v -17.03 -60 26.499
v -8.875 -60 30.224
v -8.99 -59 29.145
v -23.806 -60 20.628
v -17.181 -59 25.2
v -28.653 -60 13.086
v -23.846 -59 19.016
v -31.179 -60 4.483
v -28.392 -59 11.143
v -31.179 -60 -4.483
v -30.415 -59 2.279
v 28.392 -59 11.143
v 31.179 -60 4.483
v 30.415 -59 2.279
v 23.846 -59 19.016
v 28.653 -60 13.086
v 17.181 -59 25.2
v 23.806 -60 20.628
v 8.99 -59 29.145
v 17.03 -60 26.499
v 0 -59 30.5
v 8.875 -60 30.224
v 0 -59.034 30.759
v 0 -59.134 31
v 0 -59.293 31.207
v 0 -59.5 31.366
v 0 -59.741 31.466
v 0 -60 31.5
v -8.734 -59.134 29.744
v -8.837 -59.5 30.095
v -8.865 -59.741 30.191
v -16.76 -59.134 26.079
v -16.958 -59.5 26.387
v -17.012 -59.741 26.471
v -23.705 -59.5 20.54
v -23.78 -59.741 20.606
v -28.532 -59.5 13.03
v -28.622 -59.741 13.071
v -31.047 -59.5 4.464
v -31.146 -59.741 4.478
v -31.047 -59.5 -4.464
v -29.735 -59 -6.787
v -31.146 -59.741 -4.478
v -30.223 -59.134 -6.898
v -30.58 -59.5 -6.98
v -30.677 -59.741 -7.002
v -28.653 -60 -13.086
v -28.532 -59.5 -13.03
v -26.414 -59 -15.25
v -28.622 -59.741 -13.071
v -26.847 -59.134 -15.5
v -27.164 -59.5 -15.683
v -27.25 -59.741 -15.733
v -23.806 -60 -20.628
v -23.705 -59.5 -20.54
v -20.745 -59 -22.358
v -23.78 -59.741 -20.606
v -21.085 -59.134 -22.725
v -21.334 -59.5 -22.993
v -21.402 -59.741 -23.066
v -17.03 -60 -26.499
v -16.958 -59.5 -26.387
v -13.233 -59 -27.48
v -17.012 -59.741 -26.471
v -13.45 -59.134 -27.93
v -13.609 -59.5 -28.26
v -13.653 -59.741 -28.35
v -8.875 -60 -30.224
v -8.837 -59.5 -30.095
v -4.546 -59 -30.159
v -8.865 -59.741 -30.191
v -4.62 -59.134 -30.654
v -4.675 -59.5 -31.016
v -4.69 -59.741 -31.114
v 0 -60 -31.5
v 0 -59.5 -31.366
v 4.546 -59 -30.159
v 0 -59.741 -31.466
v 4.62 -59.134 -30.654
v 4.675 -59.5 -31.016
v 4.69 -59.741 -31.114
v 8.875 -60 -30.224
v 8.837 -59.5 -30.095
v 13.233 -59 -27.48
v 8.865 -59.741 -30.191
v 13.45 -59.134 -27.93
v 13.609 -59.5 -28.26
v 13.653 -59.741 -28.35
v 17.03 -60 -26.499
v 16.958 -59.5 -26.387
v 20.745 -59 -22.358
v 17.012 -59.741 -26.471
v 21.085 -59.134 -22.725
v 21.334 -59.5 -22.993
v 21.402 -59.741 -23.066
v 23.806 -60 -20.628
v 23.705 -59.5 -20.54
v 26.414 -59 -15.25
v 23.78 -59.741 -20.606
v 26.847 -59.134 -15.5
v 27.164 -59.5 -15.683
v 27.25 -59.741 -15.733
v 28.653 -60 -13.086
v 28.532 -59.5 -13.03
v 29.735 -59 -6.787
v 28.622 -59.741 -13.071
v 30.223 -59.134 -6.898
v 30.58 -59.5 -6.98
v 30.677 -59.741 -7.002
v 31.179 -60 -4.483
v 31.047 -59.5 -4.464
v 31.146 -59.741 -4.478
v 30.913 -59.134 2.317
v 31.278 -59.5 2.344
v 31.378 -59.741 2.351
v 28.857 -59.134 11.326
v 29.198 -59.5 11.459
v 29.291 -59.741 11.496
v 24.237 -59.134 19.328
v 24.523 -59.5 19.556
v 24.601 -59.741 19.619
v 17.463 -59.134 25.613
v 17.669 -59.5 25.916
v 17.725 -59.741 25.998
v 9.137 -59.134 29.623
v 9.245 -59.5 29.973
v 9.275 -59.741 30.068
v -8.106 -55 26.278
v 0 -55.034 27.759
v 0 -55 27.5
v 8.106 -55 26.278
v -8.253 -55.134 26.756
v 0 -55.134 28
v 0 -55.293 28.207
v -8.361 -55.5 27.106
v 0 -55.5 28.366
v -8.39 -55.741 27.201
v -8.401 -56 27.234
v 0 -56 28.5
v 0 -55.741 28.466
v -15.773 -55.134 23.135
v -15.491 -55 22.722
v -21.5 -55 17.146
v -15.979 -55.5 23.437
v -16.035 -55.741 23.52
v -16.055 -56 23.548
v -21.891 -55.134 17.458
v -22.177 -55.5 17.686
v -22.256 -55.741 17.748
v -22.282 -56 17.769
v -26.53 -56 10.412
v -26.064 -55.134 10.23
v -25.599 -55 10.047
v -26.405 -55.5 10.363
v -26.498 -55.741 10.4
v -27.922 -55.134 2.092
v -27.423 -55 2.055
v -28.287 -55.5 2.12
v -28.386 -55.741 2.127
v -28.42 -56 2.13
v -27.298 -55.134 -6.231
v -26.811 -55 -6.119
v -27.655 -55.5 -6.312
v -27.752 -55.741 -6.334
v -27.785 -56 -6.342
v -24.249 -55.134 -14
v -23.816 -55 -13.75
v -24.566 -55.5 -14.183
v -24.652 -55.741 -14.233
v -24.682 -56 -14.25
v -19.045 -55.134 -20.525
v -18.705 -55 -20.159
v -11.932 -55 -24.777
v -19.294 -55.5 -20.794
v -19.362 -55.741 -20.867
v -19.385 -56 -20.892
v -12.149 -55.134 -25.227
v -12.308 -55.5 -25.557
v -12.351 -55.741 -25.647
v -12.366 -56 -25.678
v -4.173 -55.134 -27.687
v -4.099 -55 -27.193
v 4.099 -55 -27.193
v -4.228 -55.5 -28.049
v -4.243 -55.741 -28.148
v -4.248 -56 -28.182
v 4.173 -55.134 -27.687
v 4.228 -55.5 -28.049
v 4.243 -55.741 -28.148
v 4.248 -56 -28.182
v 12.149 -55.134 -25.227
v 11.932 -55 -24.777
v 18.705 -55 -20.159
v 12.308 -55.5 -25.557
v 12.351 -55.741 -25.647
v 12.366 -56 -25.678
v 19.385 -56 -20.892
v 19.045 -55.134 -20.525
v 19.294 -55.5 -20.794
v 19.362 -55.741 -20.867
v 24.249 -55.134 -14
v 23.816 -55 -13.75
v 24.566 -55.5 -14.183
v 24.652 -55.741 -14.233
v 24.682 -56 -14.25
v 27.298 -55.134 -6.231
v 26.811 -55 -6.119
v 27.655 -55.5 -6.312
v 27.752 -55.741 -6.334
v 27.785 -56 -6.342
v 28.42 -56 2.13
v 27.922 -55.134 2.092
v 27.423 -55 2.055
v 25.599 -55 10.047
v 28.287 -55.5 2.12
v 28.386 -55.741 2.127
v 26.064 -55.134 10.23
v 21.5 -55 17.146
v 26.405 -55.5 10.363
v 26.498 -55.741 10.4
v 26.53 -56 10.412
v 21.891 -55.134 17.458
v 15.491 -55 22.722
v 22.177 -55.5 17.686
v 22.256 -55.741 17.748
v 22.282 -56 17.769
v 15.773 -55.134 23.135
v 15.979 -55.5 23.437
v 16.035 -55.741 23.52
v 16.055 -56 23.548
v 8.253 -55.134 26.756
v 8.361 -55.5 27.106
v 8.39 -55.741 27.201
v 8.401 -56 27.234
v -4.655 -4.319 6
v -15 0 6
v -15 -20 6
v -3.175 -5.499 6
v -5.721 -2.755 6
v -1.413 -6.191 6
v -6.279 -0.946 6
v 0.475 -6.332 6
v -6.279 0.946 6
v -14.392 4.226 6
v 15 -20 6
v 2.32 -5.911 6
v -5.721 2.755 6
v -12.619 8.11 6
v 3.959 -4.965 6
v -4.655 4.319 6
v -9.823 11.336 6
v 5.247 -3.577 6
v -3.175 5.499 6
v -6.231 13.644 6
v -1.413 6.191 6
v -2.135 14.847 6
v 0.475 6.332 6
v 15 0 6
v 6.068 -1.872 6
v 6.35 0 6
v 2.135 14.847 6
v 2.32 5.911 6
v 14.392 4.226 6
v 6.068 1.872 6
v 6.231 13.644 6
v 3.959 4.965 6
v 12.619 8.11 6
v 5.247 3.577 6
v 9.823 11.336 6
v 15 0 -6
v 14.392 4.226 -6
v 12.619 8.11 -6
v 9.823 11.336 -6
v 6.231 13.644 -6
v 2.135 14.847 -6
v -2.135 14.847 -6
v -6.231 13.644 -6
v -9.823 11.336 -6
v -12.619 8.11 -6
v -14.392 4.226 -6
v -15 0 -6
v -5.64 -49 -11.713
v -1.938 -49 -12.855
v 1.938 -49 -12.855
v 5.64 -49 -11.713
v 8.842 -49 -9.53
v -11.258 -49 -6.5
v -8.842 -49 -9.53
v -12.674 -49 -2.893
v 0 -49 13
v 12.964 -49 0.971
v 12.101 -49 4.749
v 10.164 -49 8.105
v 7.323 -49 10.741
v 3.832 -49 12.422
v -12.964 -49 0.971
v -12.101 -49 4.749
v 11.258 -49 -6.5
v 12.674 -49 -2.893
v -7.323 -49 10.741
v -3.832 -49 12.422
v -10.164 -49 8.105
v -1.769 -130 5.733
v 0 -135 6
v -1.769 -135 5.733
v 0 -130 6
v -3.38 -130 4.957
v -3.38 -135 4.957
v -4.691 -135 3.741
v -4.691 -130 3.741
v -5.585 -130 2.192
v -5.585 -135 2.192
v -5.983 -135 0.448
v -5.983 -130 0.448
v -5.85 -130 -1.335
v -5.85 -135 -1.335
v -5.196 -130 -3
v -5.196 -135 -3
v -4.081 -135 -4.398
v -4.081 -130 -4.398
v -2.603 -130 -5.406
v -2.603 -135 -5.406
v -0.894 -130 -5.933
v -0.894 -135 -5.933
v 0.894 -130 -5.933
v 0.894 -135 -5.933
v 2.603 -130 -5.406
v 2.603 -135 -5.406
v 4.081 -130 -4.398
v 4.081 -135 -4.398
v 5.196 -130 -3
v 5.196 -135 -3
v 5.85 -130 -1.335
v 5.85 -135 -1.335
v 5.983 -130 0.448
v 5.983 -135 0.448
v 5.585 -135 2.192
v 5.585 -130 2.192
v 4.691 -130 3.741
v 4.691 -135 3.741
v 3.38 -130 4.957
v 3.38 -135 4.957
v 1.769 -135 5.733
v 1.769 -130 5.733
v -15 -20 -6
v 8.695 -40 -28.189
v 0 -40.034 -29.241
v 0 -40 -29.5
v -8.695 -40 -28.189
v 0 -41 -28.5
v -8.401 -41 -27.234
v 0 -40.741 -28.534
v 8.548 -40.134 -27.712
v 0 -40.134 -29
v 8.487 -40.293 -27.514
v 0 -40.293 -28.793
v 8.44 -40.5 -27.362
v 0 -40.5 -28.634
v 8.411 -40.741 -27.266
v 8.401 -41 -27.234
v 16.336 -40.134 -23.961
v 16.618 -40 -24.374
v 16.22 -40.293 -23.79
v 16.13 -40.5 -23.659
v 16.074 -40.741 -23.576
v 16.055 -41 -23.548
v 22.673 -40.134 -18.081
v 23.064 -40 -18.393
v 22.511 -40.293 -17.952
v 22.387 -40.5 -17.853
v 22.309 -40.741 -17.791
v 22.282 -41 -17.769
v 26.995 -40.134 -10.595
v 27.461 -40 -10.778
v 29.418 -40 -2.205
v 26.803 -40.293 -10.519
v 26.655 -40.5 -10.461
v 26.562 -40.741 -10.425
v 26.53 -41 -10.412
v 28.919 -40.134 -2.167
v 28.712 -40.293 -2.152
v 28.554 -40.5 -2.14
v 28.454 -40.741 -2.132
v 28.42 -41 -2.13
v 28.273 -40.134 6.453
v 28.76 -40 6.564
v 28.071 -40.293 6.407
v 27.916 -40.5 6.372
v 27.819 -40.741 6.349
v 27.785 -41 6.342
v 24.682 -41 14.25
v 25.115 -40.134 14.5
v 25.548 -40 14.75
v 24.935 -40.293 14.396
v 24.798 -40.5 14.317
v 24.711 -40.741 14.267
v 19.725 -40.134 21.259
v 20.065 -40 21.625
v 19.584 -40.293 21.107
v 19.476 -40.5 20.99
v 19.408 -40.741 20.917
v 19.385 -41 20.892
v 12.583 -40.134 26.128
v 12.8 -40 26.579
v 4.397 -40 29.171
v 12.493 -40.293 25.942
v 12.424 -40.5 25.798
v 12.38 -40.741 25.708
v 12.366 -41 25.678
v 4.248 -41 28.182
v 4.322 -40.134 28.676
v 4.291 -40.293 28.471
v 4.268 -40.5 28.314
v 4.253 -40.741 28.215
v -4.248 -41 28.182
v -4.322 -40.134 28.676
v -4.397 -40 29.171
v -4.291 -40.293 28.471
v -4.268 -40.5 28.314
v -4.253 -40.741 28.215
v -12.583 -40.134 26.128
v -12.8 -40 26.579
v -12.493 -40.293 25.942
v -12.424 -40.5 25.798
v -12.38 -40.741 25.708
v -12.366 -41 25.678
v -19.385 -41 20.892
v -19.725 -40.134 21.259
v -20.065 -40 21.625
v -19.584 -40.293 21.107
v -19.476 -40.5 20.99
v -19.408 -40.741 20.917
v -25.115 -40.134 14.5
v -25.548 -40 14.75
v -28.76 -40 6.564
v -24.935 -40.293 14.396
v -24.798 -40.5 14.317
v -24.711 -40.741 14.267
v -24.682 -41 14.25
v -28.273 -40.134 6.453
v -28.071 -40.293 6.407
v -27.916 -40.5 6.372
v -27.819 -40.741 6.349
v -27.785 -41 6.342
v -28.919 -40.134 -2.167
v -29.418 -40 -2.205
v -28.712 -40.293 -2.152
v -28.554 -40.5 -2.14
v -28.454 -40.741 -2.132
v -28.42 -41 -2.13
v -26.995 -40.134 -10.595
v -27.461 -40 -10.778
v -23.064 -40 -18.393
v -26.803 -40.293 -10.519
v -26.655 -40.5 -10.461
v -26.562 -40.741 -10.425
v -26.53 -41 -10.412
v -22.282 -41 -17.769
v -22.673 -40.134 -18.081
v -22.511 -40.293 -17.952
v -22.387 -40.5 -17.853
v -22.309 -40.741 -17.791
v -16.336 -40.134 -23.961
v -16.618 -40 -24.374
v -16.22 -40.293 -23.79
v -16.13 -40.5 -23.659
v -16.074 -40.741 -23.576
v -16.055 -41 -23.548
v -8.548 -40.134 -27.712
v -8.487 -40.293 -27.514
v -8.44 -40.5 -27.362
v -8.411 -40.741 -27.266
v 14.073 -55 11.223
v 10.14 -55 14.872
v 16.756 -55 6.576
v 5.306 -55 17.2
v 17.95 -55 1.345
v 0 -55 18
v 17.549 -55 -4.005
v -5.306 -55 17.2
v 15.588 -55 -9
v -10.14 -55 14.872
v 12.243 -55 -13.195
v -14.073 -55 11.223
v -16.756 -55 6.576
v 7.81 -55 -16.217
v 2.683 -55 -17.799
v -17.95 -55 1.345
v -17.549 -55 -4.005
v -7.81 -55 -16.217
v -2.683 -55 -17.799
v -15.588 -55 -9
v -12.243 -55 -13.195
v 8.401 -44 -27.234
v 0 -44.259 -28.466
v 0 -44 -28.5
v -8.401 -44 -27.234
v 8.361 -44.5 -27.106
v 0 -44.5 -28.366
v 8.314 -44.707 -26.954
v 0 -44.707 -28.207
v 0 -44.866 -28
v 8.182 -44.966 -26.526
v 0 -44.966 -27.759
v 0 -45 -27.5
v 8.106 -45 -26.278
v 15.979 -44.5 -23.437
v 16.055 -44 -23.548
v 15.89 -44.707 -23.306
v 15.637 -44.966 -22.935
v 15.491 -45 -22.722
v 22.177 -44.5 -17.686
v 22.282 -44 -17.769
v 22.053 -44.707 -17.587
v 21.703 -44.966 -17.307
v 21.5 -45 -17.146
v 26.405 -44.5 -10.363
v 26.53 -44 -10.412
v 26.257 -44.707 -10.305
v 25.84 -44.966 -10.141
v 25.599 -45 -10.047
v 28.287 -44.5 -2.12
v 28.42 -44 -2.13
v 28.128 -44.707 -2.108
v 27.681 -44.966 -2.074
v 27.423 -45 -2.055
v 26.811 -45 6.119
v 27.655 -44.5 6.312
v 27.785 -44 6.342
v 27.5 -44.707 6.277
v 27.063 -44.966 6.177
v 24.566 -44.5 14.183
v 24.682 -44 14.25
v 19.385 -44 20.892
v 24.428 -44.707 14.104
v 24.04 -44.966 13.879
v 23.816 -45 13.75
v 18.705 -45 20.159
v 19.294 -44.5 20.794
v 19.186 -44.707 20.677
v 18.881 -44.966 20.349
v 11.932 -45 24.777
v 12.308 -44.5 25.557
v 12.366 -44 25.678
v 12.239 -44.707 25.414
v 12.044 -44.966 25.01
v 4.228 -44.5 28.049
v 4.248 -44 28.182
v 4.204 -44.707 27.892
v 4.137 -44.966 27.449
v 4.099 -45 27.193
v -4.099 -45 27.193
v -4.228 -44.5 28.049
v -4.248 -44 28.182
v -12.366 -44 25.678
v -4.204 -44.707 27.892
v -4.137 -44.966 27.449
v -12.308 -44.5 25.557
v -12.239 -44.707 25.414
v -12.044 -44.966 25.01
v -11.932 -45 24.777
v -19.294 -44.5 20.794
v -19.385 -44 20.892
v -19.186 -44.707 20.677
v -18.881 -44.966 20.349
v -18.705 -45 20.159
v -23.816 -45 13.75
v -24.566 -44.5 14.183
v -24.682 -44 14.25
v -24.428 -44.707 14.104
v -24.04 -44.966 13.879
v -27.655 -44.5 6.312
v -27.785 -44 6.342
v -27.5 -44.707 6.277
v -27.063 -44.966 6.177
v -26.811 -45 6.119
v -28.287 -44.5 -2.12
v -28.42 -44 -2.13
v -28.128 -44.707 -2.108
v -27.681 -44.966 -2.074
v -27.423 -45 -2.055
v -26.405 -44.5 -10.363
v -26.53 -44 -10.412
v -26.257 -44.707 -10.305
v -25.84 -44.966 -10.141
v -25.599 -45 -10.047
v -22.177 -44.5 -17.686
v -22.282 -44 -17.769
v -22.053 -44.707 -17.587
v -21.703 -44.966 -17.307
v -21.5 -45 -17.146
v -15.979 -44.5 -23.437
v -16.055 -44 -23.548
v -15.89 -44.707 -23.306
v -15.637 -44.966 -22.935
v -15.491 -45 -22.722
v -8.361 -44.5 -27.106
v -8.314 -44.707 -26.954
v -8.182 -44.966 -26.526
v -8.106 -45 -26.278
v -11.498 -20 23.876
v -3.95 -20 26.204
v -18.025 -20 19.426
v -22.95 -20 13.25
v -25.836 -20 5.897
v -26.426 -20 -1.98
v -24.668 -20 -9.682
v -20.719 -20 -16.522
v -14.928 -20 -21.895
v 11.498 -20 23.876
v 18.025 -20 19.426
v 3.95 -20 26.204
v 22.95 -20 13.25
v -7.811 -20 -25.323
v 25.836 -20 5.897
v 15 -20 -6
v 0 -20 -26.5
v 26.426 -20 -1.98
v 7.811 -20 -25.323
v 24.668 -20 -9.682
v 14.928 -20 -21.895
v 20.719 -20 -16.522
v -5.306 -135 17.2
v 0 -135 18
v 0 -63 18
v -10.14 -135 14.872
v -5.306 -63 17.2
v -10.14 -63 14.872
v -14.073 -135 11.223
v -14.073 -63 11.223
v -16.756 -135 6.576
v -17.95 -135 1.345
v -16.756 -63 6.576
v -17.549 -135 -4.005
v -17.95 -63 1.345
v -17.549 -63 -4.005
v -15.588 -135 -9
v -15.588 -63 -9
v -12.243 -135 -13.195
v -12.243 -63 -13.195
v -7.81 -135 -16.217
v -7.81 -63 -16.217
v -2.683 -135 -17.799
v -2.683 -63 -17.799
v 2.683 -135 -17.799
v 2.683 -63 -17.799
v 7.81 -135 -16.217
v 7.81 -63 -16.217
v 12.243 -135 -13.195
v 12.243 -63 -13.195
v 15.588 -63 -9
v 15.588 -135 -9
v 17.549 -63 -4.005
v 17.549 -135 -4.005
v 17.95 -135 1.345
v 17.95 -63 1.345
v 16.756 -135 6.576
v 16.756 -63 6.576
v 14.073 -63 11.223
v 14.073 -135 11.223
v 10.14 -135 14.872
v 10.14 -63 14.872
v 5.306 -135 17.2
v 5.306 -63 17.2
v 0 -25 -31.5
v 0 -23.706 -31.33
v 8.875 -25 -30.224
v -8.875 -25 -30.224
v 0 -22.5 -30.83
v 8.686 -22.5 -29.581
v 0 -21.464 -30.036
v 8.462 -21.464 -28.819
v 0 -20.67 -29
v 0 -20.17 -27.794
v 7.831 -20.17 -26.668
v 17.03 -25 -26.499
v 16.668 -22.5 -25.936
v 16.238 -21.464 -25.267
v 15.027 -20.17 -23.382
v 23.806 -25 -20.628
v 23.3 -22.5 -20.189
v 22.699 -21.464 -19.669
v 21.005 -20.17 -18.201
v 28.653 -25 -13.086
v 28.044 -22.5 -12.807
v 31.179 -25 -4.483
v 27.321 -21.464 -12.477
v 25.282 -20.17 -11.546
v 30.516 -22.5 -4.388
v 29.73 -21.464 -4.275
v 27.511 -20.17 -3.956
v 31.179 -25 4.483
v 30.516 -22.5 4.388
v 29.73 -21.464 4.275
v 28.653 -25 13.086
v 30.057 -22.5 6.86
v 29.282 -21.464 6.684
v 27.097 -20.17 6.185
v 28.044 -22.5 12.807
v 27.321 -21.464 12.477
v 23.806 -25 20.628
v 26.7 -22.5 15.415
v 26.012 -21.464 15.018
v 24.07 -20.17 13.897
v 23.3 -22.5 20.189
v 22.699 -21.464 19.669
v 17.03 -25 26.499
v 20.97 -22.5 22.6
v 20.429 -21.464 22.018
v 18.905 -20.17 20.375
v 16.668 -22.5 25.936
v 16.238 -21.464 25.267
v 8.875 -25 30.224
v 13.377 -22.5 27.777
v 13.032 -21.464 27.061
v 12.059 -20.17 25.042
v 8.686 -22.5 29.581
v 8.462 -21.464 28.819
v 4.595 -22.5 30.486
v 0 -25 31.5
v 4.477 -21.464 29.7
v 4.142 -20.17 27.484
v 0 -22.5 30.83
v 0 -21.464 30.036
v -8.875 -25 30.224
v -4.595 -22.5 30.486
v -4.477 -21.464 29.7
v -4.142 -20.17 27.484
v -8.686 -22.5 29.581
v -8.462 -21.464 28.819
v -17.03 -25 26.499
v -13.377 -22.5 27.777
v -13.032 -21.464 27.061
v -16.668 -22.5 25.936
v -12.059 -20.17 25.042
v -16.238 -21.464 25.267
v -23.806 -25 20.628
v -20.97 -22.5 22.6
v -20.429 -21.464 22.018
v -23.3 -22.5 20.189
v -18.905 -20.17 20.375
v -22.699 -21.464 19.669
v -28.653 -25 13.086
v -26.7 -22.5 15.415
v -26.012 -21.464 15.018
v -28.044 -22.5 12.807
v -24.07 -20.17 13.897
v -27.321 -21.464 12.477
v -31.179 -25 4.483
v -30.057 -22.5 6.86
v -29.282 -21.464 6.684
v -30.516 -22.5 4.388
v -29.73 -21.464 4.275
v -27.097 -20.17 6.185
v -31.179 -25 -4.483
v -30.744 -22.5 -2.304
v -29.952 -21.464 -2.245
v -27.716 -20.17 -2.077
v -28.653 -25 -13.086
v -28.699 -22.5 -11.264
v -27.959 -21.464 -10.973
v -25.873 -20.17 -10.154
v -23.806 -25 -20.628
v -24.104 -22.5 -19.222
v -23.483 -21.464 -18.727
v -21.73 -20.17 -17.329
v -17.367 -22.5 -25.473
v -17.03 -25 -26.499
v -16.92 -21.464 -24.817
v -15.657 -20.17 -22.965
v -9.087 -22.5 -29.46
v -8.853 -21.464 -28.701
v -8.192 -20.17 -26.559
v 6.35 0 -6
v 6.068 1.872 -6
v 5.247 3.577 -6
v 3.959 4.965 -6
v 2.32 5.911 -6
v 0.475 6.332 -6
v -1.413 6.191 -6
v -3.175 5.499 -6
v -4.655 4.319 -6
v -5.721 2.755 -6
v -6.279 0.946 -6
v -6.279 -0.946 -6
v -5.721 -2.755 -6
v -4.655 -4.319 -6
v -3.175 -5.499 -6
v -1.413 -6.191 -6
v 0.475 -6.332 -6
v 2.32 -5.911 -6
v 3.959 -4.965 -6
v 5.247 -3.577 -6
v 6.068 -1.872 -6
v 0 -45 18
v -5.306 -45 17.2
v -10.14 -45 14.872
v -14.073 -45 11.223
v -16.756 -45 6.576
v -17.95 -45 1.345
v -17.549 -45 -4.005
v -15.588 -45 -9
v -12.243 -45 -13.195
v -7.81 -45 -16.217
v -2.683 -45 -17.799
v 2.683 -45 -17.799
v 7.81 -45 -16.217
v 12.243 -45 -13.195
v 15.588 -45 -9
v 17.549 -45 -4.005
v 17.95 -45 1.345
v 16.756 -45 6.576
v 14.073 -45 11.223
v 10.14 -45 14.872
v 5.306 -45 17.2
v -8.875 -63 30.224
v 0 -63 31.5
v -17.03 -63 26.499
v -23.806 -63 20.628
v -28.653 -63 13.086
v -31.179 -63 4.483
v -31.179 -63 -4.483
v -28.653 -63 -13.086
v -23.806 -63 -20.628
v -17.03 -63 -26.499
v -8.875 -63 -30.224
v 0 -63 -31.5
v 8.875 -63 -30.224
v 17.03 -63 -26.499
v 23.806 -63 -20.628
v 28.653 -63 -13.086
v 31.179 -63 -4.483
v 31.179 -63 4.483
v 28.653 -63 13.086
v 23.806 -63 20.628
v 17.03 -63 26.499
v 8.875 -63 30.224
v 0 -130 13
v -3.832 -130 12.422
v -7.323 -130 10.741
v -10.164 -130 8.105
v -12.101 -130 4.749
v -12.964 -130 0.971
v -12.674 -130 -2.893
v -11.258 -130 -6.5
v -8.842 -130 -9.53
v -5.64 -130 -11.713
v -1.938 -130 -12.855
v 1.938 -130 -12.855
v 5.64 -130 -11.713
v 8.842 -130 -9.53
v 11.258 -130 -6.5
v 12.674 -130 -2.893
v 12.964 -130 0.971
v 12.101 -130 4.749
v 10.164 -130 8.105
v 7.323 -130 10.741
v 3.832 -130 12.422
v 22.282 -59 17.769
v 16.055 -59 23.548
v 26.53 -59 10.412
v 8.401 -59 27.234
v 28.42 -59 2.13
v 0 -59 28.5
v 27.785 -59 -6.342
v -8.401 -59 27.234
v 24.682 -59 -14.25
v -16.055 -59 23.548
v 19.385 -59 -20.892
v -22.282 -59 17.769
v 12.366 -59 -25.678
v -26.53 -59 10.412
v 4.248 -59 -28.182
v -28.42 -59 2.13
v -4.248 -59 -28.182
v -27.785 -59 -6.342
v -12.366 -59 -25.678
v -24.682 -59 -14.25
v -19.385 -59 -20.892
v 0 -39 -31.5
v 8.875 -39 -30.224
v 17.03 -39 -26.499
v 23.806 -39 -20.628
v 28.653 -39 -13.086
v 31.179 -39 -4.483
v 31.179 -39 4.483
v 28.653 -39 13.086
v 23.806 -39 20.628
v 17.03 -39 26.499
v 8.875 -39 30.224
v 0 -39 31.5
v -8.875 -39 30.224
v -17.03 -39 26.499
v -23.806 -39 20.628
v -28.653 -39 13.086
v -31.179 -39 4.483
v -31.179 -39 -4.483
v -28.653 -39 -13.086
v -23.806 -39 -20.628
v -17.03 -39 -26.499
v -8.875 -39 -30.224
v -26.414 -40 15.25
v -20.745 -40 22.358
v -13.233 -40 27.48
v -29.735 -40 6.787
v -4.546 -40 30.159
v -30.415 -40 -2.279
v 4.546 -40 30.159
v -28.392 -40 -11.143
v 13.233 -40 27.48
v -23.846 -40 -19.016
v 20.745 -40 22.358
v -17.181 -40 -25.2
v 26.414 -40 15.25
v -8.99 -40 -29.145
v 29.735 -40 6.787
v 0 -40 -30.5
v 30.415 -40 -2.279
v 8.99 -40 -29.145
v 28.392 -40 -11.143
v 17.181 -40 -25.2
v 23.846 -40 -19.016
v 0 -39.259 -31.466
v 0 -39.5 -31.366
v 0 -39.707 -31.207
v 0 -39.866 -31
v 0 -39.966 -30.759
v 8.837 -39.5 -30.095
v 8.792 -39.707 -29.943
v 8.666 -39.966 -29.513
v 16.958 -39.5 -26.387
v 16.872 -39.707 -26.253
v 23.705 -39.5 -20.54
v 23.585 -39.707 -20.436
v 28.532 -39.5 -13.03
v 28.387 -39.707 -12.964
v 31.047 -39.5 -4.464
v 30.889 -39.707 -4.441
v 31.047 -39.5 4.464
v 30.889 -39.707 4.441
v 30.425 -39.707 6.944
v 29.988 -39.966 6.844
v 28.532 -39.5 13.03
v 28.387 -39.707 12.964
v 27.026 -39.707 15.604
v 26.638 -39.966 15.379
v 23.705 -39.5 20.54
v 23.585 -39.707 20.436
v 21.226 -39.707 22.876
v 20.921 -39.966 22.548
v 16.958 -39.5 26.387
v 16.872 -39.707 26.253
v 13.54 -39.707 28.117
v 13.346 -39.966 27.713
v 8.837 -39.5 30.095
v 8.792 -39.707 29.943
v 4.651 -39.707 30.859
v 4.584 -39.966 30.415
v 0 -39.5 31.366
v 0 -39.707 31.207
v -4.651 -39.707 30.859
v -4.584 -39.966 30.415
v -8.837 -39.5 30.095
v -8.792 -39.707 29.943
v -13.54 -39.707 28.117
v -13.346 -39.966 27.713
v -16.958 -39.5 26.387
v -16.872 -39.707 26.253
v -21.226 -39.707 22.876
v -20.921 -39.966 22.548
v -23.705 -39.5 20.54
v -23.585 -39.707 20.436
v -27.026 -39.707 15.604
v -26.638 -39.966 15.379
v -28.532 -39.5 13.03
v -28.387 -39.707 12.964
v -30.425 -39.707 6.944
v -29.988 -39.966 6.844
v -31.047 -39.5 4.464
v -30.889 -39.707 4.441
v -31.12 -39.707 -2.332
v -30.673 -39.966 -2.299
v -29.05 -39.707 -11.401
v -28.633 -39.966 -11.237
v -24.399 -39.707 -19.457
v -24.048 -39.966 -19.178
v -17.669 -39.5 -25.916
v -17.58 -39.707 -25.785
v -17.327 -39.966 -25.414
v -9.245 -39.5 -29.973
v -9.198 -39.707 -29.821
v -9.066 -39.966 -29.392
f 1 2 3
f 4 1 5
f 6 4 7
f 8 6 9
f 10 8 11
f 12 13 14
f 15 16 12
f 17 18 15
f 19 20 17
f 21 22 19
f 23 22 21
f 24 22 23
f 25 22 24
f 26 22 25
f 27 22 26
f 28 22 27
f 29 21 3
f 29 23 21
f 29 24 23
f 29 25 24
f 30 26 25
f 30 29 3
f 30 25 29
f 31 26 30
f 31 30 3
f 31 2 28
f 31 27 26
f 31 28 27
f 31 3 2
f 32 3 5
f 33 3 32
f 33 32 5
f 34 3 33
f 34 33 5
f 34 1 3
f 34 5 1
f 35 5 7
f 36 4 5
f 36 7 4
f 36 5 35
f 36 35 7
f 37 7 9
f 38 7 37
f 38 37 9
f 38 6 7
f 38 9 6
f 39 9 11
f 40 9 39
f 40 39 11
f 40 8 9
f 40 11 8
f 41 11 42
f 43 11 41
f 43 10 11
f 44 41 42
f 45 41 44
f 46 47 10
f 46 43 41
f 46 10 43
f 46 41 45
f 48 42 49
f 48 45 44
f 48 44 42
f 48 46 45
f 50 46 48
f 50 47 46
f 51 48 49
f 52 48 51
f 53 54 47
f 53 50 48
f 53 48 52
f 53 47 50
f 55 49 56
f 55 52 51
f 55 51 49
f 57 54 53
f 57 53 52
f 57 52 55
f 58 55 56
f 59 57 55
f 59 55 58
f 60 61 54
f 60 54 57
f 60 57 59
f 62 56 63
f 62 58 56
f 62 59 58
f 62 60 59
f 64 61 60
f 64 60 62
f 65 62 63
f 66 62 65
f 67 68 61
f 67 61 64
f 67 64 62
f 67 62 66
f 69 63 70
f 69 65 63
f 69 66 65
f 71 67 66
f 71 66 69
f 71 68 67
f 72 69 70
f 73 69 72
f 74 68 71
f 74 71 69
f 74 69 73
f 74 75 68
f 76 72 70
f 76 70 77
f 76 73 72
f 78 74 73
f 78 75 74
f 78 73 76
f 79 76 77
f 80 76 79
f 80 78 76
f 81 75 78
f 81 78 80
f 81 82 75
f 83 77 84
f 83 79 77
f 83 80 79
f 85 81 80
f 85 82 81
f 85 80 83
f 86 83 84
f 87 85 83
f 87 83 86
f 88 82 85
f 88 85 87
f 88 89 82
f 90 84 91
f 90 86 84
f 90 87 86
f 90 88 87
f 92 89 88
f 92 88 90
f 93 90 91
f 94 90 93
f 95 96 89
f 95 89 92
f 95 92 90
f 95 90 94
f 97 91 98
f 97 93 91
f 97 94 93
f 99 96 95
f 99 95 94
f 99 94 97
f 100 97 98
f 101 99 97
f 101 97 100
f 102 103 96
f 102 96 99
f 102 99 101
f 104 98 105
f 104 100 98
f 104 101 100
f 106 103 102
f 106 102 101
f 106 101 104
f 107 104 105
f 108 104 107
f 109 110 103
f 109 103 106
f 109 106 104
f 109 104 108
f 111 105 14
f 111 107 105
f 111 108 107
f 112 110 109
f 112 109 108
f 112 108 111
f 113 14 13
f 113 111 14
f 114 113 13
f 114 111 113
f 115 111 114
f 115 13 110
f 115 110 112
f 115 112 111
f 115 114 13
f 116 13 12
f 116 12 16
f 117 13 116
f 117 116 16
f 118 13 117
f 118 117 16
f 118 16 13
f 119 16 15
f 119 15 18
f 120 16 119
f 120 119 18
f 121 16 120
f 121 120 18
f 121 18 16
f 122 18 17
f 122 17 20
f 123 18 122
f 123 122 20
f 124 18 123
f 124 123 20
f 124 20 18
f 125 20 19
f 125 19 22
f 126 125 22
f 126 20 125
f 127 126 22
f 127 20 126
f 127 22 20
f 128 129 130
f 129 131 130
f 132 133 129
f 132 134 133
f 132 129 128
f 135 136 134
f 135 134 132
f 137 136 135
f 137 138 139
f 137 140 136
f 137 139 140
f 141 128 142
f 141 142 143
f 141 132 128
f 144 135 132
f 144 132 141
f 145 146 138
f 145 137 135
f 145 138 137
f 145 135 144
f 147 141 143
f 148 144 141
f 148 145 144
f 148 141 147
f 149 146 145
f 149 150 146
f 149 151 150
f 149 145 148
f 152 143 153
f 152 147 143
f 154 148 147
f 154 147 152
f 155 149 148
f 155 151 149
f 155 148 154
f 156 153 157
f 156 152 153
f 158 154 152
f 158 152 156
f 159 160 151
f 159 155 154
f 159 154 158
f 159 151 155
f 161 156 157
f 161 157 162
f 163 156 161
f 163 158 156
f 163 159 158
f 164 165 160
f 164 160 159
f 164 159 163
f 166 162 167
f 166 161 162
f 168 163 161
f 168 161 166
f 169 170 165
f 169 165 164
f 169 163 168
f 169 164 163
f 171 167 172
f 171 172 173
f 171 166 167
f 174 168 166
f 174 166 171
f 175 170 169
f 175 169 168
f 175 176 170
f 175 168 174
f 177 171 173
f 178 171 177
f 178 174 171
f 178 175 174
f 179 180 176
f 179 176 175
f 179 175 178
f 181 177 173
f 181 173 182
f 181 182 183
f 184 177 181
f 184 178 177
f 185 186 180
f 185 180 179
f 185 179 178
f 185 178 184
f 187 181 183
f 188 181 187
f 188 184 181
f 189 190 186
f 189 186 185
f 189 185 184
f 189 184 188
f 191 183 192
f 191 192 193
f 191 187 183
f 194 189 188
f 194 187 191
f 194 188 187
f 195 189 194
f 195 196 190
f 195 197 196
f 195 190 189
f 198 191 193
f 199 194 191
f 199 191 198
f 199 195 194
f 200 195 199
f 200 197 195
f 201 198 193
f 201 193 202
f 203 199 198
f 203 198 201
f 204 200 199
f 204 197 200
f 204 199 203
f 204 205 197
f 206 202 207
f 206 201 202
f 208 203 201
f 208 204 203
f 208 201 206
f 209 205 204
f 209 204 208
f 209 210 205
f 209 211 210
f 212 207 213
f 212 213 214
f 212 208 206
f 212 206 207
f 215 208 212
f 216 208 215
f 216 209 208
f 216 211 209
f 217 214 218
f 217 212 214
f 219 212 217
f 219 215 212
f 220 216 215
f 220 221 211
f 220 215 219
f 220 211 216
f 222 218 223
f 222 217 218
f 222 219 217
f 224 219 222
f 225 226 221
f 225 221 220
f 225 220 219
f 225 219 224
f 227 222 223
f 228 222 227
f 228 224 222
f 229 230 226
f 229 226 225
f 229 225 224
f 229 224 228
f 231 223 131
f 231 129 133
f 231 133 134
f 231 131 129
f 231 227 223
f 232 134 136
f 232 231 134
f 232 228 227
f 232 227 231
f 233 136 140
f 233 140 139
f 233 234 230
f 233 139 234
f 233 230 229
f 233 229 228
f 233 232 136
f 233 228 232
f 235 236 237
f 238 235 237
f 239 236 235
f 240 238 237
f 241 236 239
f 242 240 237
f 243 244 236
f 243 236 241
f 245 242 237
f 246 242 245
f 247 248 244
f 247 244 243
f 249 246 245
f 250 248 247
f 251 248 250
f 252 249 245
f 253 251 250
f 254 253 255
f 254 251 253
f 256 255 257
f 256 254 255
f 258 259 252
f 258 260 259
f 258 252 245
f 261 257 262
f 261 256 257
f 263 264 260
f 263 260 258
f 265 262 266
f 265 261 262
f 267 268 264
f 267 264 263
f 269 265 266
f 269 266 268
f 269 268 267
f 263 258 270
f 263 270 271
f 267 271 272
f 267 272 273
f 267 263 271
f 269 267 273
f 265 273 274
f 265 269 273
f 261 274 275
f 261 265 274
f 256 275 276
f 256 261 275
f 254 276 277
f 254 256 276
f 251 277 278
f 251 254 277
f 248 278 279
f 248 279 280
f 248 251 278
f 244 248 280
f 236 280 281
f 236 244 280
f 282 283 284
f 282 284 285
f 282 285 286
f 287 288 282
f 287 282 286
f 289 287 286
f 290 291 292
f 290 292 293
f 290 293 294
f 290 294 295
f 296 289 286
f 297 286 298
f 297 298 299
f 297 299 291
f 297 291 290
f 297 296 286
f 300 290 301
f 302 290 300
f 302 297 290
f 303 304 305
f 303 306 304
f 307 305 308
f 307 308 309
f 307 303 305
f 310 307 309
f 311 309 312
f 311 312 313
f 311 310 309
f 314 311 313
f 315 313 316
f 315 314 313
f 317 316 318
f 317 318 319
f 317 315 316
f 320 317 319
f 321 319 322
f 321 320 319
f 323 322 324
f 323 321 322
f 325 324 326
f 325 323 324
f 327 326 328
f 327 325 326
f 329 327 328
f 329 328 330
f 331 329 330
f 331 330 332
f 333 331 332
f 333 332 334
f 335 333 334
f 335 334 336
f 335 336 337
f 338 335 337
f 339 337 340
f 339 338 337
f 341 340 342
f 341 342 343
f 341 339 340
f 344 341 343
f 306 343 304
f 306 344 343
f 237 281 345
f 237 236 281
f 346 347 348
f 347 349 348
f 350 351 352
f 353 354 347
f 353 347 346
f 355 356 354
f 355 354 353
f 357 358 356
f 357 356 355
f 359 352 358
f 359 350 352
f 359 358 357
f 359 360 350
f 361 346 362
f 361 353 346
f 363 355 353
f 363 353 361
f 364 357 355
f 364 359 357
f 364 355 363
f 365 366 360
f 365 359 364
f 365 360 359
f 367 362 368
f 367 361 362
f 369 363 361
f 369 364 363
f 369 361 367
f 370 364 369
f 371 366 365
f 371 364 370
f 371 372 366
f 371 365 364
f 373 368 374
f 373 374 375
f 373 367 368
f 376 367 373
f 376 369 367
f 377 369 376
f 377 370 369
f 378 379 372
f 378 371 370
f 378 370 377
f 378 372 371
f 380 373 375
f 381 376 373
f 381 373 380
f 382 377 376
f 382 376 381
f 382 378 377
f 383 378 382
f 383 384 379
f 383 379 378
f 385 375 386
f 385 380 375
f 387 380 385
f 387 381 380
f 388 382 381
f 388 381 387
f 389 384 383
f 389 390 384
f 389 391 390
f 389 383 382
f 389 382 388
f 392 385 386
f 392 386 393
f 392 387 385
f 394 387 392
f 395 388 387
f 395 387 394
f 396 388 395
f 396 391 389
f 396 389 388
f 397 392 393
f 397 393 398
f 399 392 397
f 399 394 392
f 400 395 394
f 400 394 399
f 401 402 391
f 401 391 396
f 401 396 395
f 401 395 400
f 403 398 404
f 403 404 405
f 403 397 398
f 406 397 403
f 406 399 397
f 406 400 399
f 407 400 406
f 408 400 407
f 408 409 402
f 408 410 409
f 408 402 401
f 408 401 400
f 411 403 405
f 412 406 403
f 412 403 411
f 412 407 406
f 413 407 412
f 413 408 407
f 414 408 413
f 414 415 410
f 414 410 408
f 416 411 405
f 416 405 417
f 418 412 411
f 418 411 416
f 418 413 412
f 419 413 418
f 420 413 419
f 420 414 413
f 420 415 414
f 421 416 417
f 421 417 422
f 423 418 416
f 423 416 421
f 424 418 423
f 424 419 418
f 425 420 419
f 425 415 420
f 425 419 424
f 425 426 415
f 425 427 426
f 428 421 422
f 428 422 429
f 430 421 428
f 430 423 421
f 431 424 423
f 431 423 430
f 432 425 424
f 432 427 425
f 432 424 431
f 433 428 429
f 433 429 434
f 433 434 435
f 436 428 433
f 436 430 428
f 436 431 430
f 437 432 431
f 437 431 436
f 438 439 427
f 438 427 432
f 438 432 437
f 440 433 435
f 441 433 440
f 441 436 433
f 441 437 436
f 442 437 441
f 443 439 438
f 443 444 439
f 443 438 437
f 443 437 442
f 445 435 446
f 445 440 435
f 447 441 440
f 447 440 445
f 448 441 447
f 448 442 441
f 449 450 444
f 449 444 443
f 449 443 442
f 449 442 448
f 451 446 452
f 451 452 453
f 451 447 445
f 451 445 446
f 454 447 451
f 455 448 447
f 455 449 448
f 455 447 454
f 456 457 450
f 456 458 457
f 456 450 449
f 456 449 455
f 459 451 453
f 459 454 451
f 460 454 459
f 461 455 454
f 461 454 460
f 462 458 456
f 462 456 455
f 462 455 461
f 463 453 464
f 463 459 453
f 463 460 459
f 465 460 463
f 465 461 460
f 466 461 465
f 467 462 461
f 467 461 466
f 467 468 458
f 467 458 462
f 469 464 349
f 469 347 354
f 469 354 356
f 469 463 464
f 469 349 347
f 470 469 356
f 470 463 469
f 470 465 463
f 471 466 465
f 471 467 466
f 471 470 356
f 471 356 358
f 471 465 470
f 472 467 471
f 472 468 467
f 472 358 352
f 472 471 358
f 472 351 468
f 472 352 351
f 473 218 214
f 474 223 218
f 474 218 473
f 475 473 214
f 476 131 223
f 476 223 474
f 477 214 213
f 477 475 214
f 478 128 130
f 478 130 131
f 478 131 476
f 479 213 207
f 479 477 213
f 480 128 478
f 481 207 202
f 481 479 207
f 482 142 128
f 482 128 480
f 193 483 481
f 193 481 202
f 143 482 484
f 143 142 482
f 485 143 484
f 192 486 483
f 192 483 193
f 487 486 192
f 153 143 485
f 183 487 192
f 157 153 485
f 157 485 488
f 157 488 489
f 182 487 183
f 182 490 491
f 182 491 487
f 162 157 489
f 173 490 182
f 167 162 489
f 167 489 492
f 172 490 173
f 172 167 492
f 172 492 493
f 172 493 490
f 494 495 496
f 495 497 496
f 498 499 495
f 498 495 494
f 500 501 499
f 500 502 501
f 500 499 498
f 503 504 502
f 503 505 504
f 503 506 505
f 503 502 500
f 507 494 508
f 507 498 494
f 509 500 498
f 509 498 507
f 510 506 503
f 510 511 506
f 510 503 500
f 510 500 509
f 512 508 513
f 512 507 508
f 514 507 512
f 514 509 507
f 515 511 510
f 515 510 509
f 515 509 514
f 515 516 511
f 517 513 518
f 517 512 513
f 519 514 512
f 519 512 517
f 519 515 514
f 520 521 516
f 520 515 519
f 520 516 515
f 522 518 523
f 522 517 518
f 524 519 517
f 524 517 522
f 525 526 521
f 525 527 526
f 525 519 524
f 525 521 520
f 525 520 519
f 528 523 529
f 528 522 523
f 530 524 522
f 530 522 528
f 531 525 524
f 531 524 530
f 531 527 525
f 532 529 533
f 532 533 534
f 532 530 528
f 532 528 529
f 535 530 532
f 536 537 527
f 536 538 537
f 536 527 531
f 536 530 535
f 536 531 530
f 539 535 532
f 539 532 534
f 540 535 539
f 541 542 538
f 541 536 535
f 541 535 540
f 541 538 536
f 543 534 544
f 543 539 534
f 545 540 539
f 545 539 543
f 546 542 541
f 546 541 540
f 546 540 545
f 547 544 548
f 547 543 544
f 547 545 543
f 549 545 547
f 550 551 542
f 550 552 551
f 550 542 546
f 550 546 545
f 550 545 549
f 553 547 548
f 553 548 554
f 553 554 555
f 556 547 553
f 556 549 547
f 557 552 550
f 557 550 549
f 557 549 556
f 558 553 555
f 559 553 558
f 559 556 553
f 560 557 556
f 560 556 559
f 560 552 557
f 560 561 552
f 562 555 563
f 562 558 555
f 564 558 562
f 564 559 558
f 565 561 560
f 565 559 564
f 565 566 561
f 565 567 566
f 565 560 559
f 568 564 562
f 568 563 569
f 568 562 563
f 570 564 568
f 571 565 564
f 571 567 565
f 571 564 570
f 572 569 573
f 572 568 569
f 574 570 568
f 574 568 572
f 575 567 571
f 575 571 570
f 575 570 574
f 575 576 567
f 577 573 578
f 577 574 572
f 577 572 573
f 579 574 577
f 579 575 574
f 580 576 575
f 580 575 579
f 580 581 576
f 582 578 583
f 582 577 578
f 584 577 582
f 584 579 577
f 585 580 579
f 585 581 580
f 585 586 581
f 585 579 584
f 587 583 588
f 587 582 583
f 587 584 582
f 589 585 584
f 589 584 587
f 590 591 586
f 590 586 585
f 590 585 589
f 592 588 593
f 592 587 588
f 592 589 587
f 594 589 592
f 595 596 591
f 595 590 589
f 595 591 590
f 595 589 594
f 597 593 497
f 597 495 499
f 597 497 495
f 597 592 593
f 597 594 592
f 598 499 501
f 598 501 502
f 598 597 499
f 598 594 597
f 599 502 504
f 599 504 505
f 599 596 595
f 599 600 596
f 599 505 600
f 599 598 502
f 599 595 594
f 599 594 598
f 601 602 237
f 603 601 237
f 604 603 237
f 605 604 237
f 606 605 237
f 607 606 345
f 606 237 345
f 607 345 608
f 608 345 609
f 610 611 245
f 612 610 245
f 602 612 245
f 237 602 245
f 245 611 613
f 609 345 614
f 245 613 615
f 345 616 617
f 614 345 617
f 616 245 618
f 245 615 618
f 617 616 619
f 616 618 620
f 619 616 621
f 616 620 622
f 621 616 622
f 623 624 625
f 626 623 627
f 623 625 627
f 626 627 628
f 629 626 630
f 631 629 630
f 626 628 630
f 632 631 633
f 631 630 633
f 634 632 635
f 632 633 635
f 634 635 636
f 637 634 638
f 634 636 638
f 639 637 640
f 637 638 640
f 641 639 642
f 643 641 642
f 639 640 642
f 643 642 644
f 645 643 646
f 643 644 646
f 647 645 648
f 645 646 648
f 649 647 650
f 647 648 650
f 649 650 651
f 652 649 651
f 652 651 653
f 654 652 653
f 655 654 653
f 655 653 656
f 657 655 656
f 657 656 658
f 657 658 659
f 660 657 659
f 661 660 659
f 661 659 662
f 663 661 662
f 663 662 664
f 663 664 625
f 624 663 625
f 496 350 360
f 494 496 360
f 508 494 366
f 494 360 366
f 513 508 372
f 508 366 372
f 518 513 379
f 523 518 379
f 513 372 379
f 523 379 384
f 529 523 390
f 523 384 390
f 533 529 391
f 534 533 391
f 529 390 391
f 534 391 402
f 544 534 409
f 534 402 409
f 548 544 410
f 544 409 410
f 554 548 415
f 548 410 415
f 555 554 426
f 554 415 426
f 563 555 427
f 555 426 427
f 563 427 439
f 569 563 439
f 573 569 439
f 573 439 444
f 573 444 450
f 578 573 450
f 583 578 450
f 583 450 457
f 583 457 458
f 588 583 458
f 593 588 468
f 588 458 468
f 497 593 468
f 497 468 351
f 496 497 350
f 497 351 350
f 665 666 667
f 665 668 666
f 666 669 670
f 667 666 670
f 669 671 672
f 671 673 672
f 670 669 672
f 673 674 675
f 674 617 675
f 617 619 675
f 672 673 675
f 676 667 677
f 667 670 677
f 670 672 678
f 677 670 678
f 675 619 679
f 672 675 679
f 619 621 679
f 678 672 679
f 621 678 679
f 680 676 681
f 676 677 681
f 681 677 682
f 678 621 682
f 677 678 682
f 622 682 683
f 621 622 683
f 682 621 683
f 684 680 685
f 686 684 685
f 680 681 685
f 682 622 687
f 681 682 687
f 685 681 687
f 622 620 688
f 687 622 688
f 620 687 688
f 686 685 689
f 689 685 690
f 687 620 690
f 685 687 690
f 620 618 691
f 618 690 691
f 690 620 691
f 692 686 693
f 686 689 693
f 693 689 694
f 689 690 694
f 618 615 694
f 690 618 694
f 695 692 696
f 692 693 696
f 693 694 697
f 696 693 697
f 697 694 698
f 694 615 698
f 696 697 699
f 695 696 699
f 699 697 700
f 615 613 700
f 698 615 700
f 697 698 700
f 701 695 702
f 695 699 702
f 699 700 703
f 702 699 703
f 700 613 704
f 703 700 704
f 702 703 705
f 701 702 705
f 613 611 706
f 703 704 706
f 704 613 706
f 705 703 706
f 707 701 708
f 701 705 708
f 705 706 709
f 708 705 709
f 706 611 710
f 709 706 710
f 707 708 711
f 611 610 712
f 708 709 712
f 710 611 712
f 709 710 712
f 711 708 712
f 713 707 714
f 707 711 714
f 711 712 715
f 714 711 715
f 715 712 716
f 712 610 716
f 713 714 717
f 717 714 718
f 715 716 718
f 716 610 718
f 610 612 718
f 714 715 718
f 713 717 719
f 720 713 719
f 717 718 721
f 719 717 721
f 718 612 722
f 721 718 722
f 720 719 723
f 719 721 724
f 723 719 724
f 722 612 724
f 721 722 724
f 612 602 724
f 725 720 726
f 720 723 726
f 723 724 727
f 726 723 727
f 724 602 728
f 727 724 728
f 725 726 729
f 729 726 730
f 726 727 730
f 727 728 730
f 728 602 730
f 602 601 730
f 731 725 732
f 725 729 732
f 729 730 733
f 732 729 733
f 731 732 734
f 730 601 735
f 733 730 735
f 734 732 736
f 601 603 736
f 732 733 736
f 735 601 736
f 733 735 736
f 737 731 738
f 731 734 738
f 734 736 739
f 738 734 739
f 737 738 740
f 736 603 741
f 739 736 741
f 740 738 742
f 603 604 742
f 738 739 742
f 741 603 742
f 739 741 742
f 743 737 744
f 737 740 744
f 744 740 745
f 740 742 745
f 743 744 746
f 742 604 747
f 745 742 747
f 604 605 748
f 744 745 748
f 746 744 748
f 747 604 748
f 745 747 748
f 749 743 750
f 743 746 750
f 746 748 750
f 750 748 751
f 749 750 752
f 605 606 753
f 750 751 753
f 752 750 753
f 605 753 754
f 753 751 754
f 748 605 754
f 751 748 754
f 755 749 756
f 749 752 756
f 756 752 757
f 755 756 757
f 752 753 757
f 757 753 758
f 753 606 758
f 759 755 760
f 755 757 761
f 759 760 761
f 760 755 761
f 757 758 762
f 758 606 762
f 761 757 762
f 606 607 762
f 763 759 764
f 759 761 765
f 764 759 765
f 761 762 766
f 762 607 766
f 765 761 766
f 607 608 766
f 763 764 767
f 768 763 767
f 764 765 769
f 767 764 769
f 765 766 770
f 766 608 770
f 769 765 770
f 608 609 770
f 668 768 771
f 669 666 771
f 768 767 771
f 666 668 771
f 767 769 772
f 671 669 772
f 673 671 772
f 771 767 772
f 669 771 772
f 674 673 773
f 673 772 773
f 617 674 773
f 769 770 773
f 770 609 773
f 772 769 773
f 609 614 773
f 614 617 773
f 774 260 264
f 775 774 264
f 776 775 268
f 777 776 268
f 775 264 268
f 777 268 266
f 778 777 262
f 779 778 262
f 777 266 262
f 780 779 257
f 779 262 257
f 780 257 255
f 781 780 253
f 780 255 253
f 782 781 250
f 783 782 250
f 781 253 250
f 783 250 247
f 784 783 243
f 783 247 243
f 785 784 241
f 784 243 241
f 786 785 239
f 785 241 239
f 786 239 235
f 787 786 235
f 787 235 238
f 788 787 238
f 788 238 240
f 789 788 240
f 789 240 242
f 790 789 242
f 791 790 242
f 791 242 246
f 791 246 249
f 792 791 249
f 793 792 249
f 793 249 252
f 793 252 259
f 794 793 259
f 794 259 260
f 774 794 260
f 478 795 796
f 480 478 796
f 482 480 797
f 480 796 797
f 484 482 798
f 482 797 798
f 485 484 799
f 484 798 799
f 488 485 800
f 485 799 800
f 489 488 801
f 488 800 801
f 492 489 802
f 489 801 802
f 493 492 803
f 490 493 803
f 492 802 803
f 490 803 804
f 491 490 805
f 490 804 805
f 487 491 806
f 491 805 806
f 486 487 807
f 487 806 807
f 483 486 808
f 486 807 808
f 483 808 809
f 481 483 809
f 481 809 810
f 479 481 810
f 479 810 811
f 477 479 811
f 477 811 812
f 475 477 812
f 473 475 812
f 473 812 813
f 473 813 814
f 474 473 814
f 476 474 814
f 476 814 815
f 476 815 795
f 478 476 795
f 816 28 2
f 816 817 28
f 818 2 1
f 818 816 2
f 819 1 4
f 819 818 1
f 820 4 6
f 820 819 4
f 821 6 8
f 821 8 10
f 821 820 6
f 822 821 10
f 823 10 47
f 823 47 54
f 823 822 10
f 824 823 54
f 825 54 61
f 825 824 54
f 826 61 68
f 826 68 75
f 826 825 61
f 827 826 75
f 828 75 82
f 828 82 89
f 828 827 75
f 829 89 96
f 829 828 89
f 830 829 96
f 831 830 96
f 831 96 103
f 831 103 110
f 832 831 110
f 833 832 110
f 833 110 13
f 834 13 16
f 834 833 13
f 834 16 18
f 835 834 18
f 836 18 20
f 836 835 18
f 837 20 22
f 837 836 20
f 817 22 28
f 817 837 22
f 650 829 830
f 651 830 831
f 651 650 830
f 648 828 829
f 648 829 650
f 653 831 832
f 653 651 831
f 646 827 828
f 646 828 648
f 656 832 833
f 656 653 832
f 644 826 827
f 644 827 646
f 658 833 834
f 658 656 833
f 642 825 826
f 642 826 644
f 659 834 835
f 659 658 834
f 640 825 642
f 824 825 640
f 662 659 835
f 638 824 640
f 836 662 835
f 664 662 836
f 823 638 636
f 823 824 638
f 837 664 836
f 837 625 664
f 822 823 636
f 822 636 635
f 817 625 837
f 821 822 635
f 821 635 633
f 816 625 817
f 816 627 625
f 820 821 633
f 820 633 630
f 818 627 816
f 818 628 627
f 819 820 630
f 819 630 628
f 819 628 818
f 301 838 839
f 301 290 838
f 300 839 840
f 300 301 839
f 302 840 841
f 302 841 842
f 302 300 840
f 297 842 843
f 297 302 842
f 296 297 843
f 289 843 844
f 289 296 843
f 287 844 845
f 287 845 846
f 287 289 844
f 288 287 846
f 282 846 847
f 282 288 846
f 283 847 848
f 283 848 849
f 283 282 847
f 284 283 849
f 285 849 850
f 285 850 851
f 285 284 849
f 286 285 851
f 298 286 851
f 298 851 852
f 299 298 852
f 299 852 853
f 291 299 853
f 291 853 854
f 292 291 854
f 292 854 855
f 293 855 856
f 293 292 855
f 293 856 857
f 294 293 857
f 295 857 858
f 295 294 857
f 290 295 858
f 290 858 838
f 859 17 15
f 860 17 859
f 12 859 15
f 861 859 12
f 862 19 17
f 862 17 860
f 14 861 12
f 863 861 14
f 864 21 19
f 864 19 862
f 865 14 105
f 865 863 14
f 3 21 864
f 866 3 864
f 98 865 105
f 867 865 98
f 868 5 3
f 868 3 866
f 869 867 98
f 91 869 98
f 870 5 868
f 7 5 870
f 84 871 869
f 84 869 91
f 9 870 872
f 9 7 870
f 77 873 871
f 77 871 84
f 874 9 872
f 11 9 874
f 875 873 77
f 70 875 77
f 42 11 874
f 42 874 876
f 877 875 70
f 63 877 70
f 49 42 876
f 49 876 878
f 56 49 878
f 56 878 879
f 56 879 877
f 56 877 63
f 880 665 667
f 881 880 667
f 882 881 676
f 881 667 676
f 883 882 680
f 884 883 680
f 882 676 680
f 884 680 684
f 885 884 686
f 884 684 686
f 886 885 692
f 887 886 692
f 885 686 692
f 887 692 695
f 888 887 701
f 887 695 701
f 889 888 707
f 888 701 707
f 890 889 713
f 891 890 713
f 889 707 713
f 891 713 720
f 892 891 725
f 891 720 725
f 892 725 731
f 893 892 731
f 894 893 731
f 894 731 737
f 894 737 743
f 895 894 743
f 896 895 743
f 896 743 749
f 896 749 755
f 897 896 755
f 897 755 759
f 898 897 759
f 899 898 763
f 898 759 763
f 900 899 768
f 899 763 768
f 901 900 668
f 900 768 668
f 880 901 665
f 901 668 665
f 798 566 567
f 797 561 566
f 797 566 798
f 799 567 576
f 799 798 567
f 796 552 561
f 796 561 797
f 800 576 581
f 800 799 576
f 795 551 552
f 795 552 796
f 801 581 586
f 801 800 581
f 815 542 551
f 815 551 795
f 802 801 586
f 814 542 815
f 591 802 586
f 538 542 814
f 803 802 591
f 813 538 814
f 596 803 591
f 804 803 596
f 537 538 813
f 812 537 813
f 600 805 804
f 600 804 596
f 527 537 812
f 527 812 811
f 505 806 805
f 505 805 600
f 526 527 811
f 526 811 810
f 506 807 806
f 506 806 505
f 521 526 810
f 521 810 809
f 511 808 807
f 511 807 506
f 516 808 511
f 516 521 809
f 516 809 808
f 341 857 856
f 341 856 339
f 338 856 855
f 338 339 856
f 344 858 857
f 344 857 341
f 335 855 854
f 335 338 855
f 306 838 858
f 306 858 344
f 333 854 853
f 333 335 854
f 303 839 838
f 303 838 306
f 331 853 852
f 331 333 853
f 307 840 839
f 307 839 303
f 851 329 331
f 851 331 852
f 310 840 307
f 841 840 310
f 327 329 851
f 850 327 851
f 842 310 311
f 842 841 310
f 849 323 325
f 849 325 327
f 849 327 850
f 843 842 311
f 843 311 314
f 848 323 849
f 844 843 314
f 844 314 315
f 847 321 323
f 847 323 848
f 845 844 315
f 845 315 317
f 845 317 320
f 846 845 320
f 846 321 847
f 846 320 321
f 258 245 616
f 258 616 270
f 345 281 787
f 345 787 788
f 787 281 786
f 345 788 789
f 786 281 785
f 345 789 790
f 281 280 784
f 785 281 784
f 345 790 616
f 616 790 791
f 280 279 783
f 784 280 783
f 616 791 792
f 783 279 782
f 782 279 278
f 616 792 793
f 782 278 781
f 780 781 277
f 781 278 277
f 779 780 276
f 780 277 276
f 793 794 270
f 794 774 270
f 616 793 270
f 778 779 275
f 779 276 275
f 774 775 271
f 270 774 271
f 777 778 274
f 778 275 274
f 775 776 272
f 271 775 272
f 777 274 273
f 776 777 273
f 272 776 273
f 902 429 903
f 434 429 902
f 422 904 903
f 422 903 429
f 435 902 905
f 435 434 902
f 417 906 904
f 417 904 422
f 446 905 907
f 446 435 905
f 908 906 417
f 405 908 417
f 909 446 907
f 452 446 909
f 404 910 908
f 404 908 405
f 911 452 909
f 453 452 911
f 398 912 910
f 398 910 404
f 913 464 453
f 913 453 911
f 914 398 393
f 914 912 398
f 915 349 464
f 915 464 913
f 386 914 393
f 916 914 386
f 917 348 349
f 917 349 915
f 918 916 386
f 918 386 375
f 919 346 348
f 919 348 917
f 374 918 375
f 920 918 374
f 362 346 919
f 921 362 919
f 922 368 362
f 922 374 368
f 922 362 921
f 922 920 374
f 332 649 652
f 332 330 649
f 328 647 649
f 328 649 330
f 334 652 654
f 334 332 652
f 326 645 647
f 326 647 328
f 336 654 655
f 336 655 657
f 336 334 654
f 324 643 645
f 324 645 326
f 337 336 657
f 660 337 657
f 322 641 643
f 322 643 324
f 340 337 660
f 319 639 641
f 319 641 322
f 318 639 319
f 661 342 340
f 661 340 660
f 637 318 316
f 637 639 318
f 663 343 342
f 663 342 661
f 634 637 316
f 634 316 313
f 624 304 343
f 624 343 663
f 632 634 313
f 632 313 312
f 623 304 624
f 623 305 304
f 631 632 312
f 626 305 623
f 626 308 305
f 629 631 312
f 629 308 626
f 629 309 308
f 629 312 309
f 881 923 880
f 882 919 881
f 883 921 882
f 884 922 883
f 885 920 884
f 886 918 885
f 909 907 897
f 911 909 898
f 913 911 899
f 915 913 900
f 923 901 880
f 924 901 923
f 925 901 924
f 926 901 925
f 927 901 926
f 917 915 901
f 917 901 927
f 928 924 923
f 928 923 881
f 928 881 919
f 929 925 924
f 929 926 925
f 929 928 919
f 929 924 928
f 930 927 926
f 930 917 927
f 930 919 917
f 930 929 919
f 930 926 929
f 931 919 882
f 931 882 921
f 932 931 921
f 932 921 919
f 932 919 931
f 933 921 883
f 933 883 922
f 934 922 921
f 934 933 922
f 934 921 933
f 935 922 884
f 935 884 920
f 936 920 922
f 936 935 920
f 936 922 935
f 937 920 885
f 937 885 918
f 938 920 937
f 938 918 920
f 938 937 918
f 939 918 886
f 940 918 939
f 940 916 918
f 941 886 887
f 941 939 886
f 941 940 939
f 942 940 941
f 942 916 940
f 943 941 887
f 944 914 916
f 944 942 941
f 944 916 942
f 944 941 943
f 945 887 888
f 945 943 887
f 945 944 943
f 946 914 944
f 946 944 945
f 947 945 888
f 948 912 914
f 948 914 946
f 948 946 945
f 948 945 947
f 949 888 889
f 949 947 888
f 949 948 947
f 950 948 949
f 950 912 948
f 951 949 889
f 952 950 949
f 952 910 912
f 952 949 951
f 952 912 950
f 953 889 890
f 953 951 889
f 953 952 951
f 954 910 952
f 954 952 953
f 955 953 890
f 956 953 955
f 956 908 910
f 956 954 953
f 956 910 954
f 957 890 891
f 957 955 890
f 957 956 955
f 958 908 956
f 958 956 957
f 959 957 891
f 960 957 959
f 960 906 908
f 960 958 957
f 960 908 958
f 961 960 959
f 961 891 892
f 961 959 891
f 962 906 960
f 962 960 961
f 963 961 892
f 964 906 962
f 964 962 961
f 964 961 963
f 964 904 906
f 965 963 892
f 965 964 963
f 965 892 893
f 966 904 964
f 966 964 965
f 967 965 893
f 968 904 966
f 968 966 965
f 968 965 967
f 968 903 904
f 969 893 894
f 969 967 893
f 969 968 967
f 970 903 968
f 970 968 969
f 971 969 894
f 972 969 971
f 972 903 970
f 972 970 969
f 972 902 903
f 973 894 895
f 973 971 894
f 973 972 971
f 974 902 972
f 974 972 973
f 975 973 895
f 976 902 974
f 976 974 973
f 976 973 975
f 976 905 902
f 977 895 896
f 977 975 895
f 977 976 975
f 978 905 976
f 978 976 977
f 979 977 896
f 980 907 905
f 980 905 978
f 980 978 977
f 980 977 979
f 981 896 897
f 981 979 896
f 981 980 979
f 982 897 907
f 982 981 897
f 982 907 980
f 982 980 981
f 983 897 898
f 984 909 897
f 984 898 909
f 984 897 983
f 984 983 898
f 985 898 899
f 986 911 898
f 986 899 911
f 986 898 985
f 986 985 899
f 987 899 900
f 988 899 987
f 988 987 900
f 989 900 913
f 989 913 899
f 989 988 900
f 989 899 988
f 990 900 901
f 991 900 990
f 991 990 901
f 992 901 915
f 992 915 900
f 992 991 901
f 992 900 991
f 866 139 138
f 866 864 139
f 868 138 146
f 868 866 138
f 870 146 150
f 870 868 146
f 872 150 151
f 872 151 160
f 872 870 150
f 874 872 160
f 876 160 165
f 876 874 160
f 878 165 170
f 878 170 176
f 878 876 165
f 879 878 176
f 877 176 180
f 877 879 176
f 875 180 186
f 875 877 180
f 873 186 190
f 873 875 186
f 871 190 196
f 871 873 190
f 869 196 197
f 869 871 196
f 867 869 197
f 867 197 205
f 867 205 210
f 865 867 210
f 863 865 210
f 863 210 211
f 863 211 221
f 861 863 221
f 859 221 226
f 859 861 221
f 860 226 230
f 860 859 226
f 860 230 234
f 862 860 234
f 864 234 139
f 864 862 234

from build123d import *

# Parameters (mm, degrees)
BOSS_EXTRUDE1_DEPTH = 6
SKETCH2_R           = 31.5
BOSS_EXTRUDE2_DEPTH = 20
SKETCH3_R           = 28.5
BOSS_EXTRUDE3_DEPTH = 5
FILLET1_R           = 5
FILLET2_R           = 1
SKETCH4_R           = 6.35
CUT_EXTRUDE1_DEPTH  = 13
SKETCH5_R           = 18
BOSS_EXTRUDE4_DEPTH = 90


with BuildPart() as part:
    # Sketch1 → Boss-Extrude1 (new, symmetric)
    with BuildSketch(Plane.XY):
        with BuildLine():
            Line((-15, -20), (15, -20))
            Line((15, -20), (15, 0))
            ThreePointArc((15, 0), (0, 15), (-15, 0))
            Line((-15, 0), (-15, -20))
        make_face()
    extrude(amount=BOSS_EXTRUDE1_DEPTH, both=True)

    # Sketch2 → Boss-Extrude2 (add)
    with BuildSketch(Plane.XZ.offset(20)):
        with Locations(Location((0, 0, 0), (0, 0, 270))):
            Circle(SKETCH2_R)
    extrude(amount=BOSS_EXTRUDE2_DEPTH)

    # Sketch3 → Boss-Extrude3 (add)
    with BuildSketch(Plane.XZ.offset(40)):
        with Locations(Location((0, 0, 0), (0, 0, 270))):
            Circle(SKETCH3_R)
    extrude(amount=BOSS_EXTRUDE3_DEPTH)

    # Fillet1
    fillet1_edges = [part.edges().sort_by_distance(p)[0] for p in [
        (0, -20, 31.5),
    ]]
    fillet(fillet1_edges, radius=FILLET1_R)

    # Fillet2
    fillet2_edges = [part.edges().sort_by_distance(p)[0] for p in [
        (0, -40, 31.5),
        (0, -40, 28.5),
        (0, -45, 28.5),
    ]]
    fillet(fillet2_edges, radius=FILLET2_R)

    # Sketch4 → Cut-Extrude1 (cut)
    with BuildSketch(Plane.XY.offset(6)):
        Circle(SKETCH4_R)
    extrude(amount=-CUT_EXTRUDE1_DEPTH, mode=Mode.SUBTRACT)

    # Sketch5 → Boss-Extrude4 (add)
    with BuildSketch(Plane.XZ.offset(45)):
        with Locations(Location((0, 0, 0), (0, 0, 90))):
            Circle(SKETCH5_R)
    extrude(amount=BOSS_EXTRUDE4_DEPTH)

    # Sketch7 → Cut-Revolve1 (revolve, cut)
    with BuildSketch(Plane(origin=(0, 0, 0), x_dir=(0, 0, -1), z_dir=(1, 0, 0))):
        Polygon((0, -135), (-6, -135), (-6, -130), (-13, -130), (-13, -49), (0, -49), align=None)
    revolve(axis=Axis((0, 0, 0), (0, -1, 0)), mode=Mode.SUBTRACT)

    # Sketch8 → Revolve1 (revolve)
    with BuildSketch(Plane(origin=(0, 0, 0), x_dir=(0, 0, -1), z_dir=(1, 0, 0))):
        with BuildLine():
            Line((-18, -55), (-27.5, -55))
            ThreePointArc((-27.5, -55), (-28.207106781, -55.292893219), (-28.5, -56))
            Line((-28.5, -56), (-28.5, -59))
            Line((-28.5, -59), (-30.5, -59))
            ThreePointArc((-30.5, -59), (-31.207106781, -59.292893219), (-31.5, -60))
            Line((-31.5, -60), (-31.5, -63))
            Line((-31.5, -63), (-18, -63))
            Line((-18, -63), (-18, -55))
        make_face()
    revolve(axis=Axis((0, -49.566737635, 0), (0, -1, 0)))


solid = part.part
